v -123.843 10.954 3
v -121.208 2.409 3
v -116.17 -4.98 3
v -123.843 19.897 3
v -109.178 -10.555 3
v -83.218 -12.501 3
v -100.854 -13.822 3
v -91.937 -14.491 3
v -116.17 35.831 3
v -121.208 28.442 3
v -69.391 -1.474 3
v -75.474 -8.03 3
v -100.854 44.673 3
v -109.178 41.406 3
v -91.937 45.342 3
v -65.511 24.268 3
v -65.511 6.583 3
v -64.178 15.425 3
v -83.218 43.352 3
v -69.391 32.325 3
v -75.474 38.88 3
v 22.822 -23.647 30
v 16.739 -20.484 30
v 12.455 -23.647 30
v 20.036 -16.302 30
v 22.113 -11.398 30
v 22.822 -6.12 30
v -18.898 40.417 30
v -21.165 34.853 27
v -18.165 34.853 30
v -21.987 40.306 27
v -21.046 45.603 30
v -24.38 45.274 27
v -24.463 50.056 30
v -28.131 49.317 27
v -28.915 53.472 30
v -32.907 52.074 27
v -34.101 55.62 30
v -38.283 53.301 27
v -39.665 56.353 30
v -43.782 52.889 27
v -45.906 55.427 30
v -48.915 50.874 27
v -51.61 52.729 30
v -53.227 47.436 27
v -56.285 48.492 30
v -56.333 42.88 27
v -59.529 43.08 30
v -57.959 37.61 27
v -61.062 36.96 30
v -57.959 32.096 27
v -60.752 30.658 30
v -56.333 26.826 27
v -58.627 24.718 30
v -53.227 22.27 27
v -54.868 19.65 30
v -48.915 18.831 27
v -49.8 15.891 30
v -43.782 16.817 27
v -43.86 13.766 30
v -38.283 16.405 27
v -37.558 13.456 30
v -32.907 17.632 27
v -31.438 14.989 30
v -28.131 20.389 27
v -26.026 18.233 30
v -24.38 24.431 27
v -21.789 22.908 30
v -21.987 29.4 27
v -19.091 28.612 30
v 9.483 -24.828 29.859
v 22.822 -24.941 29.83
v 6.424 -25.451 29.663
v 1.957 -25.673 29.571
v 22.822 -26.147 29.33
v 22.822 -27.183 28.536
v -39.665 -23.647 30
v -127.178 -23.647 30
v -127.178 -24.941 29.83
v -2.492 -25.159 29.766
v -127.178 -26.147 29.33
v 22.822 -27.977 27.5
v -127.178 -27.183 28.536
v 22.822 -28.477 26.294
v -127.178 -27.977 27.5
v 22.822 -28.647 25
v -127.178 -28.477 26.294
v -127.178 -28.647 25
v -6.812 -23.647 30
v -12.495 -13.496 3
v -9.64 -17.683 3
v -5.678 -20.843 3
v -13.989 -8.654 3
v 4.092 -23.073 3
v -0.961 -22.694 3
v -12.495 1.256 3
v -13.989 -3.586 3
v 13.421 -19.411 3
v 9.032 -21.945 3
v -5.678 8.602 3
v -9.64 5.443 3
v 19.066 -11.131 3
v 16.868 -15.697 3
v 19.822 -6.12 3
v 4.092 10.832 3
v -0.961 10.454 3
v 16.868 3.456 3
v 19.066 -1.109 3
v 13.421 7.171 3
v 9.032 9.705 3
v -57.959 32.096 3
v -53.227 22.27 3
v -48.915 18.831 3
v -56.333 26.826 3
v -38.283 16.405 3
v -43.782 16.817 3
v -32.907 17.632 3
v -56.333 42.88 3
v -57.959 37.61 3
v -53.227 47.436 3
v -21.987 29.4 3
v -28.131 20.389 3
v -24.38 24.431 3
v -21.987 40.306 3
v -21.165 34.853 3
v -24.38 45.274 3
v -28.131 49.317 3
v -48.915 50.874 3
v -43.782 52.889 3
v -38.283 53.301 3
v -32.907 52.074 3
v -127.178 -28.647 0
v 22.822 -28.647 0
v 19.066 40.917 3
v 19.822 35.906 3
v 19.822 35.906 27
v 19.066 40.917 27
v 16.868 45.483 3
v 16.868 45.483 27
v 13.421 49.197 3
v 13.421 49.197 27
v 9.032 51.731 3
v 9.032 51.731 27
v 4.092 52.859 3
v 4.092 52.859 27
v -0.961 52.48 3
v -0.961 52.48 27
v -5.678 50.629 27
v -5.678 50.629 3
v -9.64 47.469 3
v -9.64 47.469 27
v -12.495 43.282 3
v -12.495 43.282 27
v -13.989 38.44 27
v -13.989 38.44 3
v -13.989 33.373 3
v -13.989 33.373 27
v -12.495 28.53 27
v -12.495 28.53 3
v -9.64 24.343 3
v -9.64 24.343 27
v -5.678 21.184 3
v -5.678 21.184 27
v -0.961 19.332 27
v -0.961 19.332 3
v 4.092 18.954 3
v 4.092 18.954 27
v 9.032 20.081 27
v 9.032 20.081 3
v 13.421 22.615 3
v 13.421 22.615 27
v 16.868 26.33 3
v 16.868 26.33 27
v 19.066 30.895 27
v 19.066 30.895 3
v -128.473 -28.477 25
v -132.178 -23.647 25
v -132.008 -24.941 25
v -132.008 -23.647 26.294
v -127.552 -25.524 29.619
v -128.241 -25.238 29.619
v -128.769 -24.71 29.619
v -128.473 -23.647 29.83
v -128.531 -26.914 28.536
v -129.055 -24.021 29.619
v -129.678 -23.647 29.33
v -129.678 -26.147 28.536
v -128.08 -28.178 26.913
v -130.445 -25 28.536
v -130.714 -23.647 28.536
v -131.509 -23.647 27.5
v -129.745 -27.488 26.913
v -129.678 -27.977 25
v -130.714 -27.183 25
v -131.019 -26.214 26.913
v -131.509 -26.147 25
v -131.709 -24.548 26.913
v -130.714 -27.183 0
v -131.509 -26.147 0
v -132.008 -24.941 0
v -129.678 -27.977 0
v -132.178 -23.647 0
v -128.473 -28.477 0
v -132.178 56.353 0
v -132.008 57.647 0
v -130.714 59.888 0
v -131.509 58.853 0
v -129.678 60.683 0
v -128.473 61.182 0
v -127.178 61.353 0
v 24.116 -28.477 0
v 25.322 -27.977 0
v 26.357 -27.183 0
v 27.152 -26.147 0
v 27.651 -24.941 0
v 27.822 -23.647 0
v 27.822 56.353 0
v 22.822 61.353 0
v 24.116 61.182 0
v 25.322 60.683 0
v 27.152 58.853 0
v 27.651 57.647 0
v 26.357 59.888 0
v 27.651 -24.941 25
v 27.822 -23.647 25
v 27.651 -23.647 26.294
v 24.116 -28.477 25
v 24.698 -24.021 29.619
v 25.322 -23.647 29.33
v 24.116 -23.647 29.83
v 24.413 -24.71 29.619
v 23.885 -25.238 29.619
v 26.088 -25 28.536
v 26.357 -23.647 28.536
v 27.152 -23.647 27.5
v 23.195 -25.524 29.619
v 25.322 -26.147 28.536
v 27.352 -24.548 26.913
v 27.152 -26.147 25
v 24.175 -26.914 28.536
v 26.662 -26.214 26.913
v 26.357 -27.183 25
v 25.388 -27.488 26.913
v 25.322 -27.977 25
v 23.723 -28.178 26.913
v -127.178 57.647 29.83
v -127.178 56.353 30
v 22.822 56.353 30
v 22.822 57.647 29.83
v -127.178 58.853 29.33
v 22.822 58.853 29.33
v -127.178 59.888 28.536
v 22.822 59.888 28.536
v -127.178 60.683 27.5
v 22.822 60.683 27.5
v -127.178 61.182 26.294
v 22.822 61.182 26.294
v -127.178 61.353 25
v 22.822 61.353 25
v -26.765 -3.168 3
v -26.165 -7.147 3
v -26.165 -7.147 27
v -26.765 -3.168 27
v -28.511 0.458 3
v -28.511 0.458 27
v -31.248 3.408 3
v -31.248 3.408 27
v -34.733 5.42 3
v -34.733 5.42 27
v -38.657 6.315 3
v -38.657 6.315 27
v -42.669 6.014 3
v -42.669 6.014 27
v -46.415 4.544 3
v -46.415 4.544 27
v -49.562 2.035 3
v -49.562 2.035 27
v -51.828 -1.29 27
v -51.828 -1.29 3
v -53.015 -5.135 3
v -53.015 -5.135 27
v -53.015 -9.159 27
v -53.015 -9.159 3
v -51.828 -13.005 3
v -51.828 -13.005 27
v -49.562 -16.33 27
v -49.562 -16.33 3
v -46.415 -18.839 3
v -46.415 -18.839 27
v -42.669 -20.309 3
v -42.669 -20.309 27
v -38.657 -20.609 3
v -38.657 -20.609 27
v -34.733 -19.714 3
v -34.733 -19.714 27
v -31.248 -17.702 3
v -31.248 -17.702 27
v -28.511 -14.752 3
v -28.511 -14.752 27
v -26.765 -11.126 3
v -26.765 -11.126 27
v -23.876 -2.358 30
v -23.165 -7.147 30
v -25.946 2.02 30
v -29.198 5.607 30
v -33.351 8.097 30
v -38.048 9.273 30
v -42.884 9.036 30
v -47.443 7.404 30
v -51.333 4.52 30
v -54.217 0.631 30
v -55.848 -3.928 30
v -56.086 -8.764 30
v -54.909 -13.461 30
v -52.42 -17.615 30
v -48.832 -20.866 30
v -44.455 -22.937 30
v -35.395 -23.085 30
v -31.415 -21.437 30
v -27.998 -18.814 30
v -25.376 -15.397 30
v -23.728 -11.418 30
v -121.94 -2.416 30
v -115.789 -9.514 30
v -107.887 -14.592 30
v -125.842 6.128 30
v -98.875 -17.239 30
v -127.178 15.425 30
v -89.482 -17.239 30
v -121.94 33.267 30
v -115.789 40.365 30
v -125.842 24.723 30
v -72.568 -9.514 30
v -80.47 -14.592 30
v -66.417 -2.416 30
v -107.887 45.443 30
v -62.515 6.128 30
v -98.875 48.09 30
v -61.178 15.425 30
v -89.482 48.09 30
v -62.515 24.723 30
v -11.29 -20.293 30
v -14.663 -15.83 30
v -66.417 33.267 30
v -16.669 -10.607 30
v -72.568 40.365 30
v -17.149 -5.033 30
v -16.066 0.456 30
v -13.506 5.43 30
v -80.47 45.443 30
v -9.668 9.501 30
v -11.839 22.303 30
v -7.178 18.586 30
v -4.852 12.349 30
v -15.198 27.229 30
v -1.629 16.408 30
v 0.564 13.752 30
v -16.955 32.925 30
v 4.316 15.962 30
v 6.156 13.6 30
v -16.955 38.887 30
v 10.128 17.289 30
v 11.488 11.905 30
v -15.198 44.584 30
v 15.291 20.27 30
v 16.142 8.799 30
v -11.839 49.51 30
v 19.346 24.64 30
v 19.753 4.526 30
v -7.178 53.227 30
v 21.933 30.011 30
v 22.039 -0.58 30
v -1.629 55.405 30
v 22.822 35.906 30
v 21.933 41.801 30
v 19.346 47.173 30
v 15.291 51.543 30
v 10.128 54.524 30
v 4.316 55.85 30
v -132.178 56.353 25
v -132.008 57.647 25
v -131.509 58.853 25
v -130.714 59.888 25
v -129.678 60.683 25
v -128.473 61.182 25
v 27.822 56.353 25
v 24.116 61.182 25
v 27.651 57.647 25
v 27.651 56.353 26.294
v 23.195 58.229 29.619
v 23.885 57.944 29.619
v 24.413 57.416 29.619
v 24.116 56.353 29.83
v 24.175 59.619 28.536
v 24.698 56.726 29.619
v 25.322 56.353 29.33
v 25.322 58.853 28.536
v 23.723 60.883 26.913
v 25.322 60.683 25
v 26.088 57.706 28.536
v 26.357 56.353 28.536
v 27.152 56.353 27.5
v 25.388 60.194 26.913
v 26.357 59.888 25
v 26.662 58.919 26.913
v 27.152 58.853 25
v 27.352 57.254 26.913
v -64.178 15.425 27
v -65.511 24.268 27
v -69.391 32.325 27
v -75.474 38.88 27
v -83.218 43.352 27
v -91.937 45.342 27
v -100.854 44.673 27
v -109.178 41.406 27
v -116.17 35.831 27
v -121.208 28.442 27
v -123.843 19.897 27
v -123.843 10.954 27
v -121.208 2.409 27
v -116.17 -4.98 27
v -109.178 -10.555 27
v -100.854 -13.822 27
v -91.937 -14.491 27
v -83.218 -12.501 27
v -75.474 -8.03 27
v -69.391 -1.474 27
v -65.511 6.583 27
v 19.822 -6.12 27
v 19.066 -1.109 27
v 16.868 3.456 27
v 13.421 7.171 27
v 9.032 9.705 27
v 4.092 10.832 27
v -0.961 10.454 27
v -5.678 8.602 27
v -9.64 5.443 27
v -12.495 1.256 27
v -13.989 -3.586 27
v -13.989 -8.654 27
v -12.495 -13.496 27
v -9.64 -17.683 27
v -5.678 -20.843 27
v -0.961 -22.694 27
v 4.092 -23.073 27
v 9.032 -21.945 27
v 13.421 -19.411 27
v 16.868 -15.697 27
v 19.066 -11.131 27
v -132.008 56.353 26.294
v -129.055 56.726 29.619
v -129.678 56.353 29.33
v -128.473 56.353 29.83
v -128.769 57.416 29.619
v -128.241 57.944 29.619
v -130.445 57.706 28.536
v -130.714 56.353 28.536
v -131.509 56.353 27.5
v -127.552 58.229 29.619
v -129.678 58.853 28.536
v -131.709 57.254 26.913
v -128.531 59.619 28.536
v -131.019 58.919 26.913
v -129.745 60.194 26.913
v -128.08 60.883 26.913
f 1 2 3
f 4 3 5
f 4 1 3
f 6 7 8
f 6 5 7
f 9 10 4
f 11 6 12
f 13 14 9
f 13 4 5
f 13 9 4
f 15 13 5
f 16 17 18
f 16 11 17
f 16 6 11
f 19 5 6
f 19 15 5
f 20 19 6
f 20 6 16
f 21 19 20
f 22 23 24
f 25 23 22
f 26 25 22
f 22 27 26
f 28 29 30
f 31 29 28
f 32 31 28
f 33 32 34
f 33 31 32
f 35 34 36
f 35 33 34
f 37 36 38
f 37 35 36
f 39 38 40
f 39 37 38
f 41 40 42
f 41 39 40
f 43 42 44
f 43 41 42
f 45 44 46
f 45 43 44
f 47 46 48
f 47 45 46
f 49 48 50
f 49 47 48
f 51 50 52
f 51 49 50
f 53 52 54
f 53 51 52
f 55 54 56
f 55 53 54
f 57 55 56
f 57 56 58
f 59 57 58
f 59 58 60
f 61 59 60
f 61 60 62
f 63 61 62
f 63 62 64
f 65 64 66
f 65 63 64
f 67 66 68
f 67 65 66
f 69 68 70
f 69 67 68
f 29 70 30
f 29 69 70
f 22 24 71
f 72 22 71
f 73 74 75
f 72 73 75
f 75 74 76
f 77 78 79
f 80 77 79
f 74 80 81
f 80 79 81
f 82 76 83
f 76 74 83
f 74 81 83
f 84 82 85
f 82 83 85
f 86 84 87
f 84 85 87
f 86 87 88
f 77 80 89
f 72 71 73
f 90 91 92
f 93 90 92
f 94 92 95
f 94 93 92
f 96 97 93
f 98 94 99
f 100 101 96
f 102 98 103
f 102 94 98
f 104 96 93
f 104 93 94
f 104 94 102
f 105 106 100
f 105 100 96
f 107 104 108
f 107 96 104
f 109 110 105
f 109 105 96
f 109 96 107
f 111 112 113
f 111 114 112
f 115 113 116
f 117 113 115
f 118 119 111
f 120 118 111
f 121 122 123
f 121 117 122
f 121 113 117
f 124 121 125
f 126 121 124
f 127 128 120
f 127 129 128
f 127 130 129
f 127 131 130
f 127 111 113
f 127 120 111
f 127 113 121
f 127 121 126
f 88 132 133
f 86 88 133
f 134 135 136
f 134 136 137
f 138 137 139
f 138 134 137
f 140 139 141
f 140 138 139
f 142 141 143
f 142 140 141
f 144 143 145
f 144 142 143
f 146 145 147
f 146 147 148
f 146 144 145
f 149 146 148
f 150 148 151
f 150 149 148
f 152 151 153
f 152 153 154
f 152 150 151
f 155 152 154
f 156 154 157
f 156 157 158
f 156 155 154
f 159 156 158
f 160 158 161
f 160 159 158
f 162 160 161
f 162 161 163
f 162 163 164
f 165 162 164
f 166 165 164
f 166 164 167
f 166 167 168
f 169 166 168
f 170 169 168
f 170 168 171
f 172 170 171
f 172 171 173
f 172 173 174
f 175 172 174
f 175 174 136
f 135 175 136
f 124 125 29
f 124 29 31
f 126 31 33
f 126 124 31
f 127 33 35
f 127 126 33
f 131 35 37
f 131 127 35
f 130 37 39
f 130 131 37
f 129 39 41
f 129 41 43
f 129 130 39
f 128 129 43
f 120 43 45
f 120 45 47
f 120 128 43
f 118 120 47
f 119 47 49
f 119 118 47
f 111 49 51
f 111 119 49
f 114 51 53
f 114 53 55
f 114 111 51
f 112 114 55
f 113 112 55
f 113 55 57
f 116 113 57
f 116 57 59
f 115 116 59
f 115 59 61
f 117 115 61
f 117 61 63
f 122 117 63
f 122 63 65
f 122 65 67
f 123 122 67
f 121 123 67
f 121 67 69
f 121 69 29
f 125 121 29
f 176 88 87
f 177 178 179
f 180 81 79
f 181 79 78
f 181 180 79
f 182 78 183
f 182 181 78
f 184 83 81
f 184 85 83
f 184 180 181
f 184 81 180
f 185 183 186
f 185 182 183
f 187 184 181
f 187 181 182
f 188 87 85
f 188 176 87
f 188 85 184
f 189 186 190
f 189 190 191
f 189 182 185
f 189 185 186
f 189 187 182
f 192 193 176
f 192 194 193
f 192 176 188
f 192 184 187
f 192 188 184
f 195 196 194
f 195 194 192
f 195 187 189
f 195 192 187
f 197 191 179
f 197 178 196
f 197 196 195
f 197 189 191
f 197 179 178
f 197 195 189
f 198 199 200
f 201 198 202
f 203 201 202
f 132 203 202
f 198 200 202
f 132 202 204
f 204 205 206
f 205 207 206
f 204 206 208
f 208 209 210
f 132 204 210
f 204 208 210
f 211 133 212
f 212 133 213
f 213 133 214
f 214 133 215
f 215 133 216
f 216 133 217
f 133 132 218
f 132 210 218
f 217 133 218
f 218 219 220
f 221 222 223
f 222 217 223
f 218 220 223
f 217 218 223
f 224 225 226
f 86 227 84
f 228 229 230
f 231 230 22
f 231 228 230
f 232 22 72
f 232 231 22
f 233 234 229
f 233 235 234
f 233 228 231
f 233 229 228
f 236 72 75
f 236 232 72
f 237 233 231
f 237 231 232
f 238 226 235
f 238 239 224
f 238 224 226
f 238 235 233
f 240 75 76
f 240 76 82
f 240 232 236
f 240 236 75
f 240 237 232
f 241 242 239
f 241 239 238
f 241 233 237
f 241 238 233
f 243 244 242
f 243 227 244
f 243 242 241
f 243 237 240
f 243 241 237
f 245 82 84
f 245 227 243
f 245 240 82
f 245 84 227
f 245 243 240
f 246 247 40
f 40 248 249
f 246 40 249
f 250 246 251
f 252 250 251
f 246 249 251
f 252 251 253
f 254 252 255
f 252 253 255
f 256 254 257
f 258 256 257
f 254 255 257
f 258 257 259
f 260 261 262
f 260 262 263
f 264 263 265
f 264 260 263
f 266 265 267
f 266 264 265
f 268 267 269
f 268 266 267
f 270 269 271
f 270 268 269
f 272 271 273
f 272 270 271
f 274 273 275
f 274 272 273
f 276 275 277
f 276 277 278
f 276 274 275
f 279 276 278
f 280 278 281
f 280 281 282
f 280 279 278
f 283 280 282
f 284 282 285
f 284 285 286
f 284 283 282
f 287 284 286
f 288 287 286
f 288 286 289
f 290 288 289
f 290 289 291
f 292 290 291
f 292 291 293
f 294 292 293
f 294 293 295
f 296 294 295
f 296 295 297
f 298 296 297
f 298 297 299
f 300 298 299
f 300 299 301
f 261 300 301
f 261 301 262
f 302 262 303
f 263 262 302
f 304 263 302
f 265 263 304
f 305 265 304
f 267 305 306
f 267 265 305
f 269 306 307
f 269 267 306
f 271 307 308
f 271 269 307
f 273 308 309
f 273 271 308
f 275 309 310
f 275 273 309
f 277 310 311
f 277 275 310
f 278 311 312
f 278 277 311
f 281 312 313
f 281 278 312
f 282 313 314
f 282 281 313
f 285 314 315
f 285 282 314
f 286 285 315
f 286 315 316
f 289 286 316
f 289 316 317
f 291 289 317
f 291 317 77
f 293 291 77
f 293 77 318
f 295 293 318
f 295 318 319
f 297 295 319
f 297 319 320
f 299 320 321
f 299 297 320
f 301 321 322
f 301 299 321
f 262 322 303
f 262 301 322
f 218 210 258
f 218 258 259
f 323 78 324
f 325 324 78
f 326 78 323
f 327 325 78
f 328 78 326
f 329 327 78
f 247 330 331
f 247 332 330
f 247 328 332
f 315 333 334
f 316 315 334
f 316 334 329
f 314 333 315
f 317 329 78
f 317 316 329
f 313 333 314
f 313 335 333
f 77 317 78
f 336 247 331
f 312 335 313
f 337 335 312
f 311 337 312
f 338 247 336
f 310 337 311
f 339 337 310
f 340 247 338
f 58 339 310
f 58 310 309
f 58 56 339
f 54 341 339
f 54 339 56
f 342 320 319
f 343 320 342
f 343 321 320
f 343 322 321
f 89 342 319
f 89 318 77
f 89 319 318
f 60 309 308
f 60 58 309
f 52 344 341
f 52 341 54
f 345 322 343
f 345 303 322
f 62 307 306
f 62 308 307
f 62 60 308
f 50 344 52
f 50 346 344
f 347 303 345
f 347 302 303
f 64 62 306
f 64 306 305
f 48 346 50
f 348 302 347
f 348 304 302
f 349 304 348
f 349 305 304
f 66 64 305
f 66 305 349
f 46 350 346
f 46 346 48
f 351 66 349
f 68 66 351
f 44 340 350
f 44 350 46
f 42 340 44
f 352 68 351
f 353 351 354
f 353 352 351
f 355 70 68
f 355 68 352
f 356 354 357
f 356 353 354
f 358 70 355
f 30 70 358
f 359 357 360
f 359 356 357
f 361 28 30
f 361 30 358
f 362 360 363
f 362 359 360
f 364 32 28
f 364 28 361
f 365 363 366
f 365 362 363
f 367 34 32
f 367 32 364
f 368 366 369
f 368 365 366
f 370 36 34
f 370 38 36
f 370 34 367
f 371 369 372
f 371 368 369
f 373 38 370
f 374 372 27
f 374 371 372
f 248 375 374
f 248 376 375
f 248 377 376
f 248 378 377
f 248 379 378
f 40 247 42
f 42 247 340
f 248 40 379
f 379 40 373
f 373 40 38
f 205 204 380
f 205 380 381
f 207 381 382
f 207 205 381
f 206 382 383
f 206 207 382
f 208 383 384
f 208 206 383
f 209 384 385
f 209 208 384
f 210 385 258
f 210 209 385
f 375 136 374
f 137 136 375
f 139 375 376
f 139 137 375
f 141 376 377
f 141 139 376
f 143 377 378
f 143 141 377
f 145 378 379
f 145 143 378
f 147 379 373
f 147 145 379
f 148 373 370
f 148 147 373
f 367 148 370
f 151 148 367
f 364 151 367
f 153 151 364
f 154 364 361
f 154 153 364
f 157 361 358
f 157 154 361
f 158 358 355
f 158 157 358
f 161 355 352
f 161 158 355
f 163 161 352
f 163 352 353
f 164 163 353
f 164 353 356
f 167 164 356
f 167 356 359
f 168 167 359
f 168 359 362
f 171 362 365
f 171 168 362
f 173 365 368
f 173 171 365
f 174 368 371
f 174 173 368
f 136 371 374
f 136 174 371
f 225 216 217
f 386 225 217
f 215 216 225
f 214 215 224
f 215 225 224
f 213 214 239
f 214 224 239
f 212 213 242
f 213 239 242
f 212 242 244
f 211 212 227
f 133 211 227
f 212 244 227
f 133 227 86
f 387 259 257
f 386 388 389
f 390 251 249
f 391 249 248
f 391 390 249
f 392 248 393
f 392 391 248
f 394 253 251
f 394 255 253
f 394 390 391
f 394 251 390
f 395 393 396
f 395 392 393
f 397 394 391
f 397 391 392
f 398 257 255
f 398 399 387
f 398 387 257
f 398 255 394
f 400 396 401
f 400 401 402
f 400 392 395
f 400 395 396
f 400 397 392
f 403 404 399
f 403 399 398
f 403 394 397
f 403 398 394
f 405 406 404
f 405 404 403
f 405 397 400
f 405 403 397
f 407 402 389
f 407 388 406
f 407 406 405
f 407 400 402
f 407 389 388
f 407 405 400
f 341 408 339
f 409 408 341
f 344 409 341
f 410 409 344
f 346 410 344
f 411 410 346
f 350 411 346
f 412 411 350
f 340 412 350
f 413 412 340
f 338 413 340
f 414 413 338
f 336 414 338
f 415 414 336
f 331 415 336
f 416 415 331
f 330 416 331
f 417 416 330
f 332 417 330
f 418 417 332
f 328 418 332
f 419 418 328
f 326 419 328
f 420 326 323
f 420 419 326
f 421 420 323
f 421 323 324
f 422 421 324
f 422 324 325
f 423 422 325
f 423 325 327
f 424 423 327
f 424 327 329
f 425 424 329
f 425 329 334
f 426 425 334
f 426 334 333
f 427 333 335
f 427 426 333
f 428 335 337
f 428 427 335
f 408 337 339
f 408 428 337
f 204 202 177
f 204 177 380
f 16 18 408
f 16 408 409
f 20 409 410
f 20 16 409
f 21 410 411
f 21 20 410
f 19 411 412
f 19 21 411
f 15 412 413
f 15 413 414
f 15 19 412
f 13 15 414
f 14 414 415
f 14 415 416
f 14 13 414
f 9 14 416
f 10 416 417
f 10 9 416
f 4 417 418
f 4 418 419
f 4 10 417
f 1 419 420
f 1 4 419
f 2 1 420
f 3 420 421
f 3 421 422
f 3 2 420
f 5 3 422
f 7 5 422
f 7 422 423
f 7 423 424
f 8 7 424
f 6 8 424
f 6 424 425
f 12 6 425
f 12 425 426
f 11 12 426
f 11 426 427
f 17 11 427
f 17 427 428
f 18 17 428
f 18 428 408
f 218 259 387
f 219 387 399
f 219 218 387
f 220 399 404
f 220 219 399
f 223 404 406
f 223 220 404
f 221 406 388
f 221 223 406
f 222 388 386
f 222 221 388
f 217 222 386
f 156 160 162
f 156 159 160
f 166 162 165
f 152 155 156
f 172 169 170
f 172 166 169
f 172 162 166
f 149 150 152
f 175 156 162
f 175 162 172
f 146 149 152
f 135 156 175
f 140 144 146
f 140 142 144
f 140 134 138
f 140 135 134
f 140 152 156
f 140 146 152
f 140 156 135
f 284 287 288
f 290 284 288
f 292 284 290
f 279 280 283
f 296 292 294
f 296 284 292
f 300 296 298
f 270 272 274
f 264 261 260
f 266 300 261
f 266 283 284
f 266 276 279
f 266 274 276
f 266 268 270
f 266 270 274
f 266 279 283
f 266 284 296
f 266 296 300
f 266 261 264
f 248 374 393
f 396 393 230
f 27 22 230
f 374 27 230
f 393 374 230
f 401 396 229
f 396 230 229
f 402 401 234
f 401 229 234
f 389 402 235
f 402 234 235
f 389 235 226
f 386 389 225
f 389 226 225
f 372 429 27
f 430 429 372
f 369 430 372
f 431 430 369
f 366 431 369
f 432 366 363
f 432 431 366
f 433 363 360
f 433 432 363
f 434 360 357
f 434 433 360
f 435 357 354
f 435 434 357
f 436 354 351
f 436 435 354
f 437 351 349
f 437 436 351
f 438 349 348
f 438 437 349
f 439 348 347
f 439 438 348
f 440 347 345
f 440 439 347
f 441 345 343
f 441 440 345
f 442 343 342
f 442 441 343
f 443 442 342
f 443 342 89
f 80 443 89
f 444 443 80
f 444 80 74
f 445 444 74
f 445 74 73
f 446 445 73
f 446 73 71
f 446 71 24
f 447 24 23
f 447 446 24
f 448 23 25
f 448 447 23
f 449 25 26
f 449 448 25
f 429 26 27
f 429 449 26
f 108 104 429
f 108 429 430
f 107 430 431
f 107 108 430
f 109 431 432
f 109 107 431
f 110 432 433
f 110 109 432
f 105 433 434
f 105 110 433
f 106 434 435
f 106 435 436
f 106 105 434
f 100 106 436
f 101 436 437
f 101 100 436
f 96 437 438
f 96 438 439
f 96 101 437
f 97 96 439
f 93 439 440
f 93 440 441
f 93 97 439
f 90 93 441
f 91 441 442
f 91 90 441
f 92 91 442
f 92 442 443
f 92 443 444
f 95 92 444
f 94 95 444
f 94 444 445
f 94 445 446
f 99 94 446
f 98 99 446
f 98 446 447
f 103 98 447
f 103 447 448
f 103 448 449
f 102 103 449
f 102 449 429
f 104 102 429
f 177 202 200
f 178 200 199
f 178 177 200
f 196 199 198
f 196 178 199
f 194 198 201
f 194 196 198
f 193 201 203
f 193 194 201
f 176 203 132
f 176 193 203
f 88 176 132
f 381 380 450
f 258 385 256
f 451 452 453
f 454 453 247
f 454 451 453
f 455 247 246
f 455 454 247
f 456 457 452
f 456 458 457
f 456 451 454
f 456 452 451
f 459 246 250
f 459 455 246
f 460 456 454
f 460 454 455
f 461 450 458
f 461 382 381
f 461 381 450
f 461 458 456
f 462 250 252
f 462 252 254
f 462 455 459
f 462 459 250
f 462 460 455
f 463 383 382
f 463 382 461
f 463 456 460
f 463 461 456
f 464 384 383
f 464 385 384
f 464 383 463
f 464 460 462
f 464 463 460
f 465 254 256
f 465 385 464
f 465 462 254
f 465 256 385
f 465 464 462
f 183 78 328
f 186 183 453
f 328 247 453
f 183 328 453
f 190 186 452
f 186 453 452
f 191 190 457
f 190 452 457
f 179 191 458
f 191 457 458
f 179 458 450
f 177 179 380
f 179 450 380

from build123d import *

# Parameters (mm, degrees)
F0_W     = 160
F0_H     = 90
F0_R     = 30
F0_R_2   = 13.5
F0_R_3   = 17
F0_R_4   = 18.5
F1_DEPTH = 30
F2_DEPTH = 3
F3_R     = 5
F4_R     = 5


# Not quite as in the source:
# - a fillet or chamfer that OpenCascade refuses, or shapes differently, is made with other operations: its cross-section is extruded or revolved along the edge and cut away or added


with BuildPart() as f1:
    # F0 (on Top) → F1 (new body)
    with BuildSketch(Plane.XY):
        with Locations((-52.1784374716, 16.3527858257)):
            Rectangle(F0_W, F0_H)
        with Locations((-94.1784374716, 15.4254203662)):
            Circle(F0_R, mode=Mode.SUBTRACT)
        with Locations((-39.6653786302, -7.1472141743)):
            Circle(F0_R_2, mode=Mode.SUBTRACT)
        with Locations((2.8215625284, -6.1201333007)):
            Circle(F0_R_3, mode=Mode.SUBTRACT)
        with Locations((-39.6653786302, 34.8527858257)):
            Circle(F0_R_4, mode=Mode.SUBTRACT)
        with Locations((2.8215625284, 35.9062709907)):
            Circle(F0_R_3, mode=Mode.SUBTRACT)
    extrude(amount=F1_DEPTH)

    # F0 (on Top) → F2 (join)
    with BuildSketch(Plane.XY):
        with Locations((-52.1784374716, 16.3527858257)):
            Rectangle(F0_W, F0_H)
        with Locations((-94.1784374716, 15.4254203662)):
            Circle(F0_R, mode=Mode.SUBTRACT)
        with Locations((-39.6653786302, -7.1472141743)):
            Circle(F0_R_2, mode=Mode.SUBTRACT)
        with Locations((2.8215625284, -6.1201333007)):
            Circle(F0_R_3, mode=Mode.SUBTRACT)
        with Locations((-39.6653786302, 34.8527858257)):
            Circle(F0_R_4, mode=Mode.SUBTRACT)
        with Locations((2.8215625284, 35.9062709907)):
            Circle(F0_R_3, mode=Mode.SUBTRACT)
        with Locations((-94.1784374716, 15.4254203662)):
            Circle(F0_R)
        with Locations((-39.6653786302, -7.1472141743)):
            Circle(F0_R_2)
        with Locations((2.8215625284, -6.1201333007)):
            Circle(F0_R_3)
        with Locations((2.8215625284, 35.9062709907)):
            Circle(F0_R_3)
        with Locations((-39.6653786302, 34.8527858257)):
            Circle(F0_R_4)
    extrude(amount=F2_DEPTH)

    # F3
    f3_edges = [f1.edges().sort_by_distance(p)[0] for p in [
        (27.821563, 61.352786, 15),
        (27.821563, -28.647214, 15),
        (-132.178437, -28.647214, 15),
        (-132.178437, 61.352786, 15),
    ]]
    fillet(f3_edges, radius=F3_R)

    # F4
    f4_edges = [f1.edges().sort_by_distance(p)[0] for p in [
        (-52.178437, 61.352786, 30),
        (27.821563, 16.352786, 30),
        (-52.178437, -28.647214, 30),
        (-132.178437, 16.352786, 30),
        (26.357096, -27.182748, 30),
        (26.357096, 59.88832, 30),
        (-130.713971, -27.182748, 30),
        (-130.713971, 59.88832, 30),
    ]]
    fillet(f4_edges, radius=F4_R)

    # F5: chamfer of 3 on 5 edges, made by hand

    # F5_s1 → F5_t2 (revolve, cut)
    with BuildSketch(Plane.XZ.offset(-15.4254203662)):
        Polygon((-61.1784374716, 30), (-64.1784374716, 27), (-64.1784374716, 30), align=None)
    revolve(axis=Axis((-94.1784374716, 15.4254203662, 30), (0, 0, 1)), mode=Mode.SUBTRACT)

    # F5_s3 → F5_t4 (revolve, cut)
    with BuildSketch(Plane.XZ.offset(-34.8527858257)):
        Polygon((-18.1653786302, 30), (-21.1653786302, 27), (-21.1653786302, 30), align=None)
    revolve(axis=Axis((-39.6653786302, 34.8527858257, 30), (0, 0, 1)), mode=Mode.SUBTRACT)

    # F5_s5 → F5_t6 (revolve, cut)
    with BuildSketch(Plane.XZ.offset(-35.9062709907)):
        Polygon((22.8215625284, 30), (19.8215625284, 27), (19.8215625284, 30), align=None)
    revolve(axis=Axis((2.8215625284, 35.9062709907, 30), (0, 0, 1)), mode=Mode.SUBTRACT)

    # F5_s7 → F5_t8 (revolve, cut)
    with BuildSketch(Plane.XZ.offset(6.1201333007)):
        Polygon((22.8215625284, 30), (19.8215625284, 27), (19.8215625284, 30), align=None)
    revolve(axis=Axis((2.8215625284, -6.1201333007, 30), (0, 0, 1)), mode=Mode.SUBTRACT)

    # F5_s9 → F5_t10 (revolve, cut)
    with BuildSketch(Plane.XZ.offset(7.1472141743)):
        Polygon((-23.1653786302, 30), (-26.1653786302, 27), (-26.1653786302, 30), align=None)
    revolve(axis=Axis((-39.6653786302, -7.1472141743, 30), (0, 0, 1)), mode=Mode.SUBTRACT)


solid = f1.part
